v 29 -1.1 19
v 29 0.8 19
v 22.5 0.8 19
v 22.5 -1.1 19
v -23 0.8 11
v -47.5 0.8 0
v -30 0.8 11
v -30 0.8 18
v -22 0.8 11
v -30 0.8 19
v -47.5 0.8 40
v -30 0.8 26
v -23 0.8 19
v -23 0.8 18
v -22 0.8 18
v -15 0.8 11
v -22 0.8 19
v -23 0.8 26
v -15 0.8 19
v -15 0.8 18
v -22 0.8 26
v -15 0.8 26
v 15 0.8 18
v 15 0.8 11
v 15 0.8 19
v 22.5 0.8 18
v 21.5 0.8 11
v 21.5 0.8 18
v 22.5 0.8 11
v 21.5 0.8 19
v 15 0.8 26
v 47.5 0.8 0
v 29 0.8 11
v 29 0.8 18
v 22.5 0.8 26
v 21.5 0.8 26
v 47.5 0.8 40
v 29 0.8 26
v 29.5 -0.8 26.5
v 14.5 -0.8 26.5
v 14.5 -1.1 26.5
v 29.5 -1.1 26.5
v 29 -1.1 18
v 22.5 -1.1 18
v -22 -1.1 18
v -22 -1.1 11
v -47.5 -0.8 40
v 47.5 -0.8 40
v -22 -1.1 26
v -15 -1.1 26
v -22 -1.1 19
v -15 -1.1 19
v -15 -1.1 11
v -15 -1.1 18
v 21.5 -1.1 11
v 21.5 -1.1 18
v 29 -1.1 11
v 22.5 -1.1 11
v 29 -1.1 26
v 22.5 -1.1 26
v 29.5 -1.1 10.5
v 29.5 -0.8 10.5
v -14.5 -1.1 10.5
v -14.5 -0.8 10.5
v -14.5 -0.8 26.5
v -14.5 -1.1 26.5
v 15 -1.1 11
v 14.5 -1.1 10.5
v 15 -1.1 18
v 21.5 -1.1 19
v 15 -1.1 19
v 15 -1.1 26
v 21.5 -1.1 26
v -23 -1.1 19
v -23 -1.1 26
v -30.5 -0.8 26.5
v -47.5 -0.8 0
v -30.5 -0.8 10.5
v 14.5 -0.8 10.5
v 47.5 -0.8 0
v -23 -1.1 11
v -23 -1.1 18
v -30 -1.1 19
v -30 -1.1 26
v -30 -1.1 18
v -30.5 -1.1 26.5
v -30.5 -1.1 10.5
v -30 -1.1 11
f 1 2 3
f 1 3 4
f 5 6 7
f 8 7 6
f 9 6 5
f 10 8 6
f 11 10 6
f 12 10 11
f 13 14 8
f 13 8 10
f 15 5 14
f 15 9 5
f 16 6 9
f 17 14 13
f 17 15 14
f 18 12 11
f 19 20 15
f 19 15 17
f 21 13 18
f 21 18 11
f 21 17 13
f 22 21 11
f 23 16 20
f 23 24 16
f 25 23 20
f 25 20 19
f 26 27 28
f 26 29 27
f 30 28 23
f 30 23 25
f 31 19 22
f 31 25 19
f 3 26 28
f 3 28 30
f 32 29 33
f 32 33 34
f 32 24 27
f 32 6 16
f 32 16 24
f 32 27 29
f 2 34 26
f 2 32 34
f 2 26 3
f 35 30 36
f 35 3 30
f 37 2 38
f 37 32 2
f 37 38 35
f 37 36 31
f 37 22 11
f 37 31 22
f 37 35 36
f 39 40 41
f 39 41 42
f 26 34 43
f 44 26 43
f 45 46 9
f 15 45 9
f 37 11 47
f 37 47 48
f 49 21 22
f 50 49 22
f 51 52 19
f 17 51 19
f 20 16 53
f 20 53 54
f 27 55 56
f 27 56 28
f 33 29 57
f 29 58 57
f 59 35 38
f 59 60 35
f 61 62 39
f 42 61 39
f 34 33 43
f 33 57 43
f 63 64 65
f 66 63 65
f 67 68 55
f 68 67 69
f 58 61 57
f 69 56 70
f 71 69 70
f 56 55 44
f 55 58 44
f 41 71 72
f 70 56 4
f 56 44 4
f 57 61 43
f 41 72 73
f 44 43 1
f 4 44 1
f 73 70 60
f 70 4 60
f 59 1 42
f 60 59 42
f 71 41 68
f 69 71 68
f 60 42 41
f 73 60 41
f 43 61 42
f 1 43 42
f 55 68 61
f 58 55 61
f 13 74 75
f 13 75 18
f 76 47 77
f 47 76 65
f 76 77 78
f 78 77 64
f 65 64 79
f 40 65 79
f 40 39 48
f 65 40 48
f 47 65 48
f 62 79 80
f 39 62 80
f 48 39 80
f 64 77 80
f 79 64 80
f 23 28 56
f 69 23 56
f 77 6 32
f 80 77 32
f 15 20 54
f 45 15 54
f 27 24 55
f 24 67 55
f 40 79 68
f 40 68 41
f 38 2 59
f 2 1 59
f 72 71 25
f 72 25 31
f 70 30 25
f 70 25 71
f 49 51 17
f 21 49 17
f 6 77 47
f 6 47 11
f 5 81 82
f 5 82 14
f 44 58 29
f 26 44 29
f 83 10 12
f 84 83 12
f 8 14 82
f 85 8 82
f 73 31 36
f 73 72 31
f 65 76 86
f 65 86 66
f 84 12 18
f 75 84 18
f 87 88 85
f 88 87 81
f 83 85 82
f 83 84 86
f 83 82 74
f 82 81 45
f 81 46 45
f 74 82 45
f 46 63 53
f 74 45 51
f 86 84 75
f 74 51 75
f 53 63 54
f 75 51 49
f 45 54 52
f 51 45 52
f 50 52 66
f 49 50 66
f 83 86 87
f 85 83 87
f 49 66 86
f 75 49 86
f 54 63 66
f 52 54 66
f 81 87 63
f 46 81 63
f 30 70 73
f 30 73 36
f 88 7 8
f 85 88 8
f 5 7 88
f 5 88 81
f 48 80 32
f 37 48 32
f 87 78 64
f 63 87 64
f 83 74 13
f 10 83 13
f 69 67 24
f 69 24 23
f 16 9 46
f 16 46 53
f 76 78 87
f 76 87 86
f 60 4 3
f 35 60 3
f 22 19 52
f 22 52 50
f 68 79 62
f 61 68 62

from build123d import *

# Parameters (mm, degrees)
F0_W      = 95
F0_H      = 1.6
F1_DEPTH  = 40
F2_W      = 15
F2_H      = 15
F2_W_2    = 14
F3_DEPTH  = 25
F4_W      = 16
F4_H      = 16
F4_W_2    = 15
F4_H_2    = 15
F4_W_3    = 14
F5_DEPTH  = 0.3
F6_W      = 1
F6_H      = 1.9
F7_DEPTH  = 15
F11_DEPTH = 15
F10_W     = 1.9
F10_H     = 1
F12_DEPTH = 14


with BuildPart() as f1:
    # F0 (on Top) → F1 (new body)
    with BuildSketch(Plane.XY):
        Rectangle(F0_W, F0_H)
    extrude(amount=F1_DEPTH)

    # F2 (on face) → F3 (cut)
    with BuildSketch(Plane.XZ.offset(0.8)):
        with Locations((-22.5, 18.5)):
            Rectangle(F2_W, F2_H)
        with Locations((22, 18.5)):
            Rectangle(F2_W_2, F2_H)
    extrude(amount=-F3_DEPTH, mode=Mode.SUBTRACT)

    # F4 (on face) → F5 (join)
    with BuildSketch(Plane.XZ.offset(0.8)):
        with Locations((-22.5, 18.5)):
            Rectangle(F4_W, F4_H)
        with Locations((-22.5, 18.5)):
            Rectangle(F4_W_2, F4_H_2, mode=Mode.SUBTRACT)
        with Locations((22, 18.5)):
            Rectangle(F4_W_2, F4_H)
        with Locations((22, 18.5)):
            Rectangle(F4_W_3, F4_H_2, mode=Mode.SUBTRACT)
    extrude(amount=F5_DEPTH)

    # F6 (on face) → F7 (join, through all)
    with BuildSketch(Plane.XY.offset(11)):
        with Locations((22, -0.15)):
            Rectangle(F6_W, F6_H)
        with Locations((-22.5, -0.15)):
            Rectangle(F6_W, F6_H)
    extrude(amount=F7_DEPTH)

    # F9 (on face) → F11 (join, through all)
    with BuildSketch(Plane(origin=(-15, 0, 0), x_dir=(0, -1, 0), z_dir=(-1, 0, 0))):
        Polygon((-0.8, 18), (0.8, 18), (1.1, 18), (1.1, 19), (-0.8, 19), align=None)
    extrude(amount=F11_DEPTH)

    # F10 (on face) → F12 (join, through all)
    with BuildSketch(Plane(origin=(29, 0, 0), x_dir=(0, -1, 0), z_dir=(-1, 0, 0))):
        with Locations((0.15, 18.5)):
            Rectangle(F10_W, F10_H)
    extrude(amount=F12_DEPTH)


solid = f1.part
